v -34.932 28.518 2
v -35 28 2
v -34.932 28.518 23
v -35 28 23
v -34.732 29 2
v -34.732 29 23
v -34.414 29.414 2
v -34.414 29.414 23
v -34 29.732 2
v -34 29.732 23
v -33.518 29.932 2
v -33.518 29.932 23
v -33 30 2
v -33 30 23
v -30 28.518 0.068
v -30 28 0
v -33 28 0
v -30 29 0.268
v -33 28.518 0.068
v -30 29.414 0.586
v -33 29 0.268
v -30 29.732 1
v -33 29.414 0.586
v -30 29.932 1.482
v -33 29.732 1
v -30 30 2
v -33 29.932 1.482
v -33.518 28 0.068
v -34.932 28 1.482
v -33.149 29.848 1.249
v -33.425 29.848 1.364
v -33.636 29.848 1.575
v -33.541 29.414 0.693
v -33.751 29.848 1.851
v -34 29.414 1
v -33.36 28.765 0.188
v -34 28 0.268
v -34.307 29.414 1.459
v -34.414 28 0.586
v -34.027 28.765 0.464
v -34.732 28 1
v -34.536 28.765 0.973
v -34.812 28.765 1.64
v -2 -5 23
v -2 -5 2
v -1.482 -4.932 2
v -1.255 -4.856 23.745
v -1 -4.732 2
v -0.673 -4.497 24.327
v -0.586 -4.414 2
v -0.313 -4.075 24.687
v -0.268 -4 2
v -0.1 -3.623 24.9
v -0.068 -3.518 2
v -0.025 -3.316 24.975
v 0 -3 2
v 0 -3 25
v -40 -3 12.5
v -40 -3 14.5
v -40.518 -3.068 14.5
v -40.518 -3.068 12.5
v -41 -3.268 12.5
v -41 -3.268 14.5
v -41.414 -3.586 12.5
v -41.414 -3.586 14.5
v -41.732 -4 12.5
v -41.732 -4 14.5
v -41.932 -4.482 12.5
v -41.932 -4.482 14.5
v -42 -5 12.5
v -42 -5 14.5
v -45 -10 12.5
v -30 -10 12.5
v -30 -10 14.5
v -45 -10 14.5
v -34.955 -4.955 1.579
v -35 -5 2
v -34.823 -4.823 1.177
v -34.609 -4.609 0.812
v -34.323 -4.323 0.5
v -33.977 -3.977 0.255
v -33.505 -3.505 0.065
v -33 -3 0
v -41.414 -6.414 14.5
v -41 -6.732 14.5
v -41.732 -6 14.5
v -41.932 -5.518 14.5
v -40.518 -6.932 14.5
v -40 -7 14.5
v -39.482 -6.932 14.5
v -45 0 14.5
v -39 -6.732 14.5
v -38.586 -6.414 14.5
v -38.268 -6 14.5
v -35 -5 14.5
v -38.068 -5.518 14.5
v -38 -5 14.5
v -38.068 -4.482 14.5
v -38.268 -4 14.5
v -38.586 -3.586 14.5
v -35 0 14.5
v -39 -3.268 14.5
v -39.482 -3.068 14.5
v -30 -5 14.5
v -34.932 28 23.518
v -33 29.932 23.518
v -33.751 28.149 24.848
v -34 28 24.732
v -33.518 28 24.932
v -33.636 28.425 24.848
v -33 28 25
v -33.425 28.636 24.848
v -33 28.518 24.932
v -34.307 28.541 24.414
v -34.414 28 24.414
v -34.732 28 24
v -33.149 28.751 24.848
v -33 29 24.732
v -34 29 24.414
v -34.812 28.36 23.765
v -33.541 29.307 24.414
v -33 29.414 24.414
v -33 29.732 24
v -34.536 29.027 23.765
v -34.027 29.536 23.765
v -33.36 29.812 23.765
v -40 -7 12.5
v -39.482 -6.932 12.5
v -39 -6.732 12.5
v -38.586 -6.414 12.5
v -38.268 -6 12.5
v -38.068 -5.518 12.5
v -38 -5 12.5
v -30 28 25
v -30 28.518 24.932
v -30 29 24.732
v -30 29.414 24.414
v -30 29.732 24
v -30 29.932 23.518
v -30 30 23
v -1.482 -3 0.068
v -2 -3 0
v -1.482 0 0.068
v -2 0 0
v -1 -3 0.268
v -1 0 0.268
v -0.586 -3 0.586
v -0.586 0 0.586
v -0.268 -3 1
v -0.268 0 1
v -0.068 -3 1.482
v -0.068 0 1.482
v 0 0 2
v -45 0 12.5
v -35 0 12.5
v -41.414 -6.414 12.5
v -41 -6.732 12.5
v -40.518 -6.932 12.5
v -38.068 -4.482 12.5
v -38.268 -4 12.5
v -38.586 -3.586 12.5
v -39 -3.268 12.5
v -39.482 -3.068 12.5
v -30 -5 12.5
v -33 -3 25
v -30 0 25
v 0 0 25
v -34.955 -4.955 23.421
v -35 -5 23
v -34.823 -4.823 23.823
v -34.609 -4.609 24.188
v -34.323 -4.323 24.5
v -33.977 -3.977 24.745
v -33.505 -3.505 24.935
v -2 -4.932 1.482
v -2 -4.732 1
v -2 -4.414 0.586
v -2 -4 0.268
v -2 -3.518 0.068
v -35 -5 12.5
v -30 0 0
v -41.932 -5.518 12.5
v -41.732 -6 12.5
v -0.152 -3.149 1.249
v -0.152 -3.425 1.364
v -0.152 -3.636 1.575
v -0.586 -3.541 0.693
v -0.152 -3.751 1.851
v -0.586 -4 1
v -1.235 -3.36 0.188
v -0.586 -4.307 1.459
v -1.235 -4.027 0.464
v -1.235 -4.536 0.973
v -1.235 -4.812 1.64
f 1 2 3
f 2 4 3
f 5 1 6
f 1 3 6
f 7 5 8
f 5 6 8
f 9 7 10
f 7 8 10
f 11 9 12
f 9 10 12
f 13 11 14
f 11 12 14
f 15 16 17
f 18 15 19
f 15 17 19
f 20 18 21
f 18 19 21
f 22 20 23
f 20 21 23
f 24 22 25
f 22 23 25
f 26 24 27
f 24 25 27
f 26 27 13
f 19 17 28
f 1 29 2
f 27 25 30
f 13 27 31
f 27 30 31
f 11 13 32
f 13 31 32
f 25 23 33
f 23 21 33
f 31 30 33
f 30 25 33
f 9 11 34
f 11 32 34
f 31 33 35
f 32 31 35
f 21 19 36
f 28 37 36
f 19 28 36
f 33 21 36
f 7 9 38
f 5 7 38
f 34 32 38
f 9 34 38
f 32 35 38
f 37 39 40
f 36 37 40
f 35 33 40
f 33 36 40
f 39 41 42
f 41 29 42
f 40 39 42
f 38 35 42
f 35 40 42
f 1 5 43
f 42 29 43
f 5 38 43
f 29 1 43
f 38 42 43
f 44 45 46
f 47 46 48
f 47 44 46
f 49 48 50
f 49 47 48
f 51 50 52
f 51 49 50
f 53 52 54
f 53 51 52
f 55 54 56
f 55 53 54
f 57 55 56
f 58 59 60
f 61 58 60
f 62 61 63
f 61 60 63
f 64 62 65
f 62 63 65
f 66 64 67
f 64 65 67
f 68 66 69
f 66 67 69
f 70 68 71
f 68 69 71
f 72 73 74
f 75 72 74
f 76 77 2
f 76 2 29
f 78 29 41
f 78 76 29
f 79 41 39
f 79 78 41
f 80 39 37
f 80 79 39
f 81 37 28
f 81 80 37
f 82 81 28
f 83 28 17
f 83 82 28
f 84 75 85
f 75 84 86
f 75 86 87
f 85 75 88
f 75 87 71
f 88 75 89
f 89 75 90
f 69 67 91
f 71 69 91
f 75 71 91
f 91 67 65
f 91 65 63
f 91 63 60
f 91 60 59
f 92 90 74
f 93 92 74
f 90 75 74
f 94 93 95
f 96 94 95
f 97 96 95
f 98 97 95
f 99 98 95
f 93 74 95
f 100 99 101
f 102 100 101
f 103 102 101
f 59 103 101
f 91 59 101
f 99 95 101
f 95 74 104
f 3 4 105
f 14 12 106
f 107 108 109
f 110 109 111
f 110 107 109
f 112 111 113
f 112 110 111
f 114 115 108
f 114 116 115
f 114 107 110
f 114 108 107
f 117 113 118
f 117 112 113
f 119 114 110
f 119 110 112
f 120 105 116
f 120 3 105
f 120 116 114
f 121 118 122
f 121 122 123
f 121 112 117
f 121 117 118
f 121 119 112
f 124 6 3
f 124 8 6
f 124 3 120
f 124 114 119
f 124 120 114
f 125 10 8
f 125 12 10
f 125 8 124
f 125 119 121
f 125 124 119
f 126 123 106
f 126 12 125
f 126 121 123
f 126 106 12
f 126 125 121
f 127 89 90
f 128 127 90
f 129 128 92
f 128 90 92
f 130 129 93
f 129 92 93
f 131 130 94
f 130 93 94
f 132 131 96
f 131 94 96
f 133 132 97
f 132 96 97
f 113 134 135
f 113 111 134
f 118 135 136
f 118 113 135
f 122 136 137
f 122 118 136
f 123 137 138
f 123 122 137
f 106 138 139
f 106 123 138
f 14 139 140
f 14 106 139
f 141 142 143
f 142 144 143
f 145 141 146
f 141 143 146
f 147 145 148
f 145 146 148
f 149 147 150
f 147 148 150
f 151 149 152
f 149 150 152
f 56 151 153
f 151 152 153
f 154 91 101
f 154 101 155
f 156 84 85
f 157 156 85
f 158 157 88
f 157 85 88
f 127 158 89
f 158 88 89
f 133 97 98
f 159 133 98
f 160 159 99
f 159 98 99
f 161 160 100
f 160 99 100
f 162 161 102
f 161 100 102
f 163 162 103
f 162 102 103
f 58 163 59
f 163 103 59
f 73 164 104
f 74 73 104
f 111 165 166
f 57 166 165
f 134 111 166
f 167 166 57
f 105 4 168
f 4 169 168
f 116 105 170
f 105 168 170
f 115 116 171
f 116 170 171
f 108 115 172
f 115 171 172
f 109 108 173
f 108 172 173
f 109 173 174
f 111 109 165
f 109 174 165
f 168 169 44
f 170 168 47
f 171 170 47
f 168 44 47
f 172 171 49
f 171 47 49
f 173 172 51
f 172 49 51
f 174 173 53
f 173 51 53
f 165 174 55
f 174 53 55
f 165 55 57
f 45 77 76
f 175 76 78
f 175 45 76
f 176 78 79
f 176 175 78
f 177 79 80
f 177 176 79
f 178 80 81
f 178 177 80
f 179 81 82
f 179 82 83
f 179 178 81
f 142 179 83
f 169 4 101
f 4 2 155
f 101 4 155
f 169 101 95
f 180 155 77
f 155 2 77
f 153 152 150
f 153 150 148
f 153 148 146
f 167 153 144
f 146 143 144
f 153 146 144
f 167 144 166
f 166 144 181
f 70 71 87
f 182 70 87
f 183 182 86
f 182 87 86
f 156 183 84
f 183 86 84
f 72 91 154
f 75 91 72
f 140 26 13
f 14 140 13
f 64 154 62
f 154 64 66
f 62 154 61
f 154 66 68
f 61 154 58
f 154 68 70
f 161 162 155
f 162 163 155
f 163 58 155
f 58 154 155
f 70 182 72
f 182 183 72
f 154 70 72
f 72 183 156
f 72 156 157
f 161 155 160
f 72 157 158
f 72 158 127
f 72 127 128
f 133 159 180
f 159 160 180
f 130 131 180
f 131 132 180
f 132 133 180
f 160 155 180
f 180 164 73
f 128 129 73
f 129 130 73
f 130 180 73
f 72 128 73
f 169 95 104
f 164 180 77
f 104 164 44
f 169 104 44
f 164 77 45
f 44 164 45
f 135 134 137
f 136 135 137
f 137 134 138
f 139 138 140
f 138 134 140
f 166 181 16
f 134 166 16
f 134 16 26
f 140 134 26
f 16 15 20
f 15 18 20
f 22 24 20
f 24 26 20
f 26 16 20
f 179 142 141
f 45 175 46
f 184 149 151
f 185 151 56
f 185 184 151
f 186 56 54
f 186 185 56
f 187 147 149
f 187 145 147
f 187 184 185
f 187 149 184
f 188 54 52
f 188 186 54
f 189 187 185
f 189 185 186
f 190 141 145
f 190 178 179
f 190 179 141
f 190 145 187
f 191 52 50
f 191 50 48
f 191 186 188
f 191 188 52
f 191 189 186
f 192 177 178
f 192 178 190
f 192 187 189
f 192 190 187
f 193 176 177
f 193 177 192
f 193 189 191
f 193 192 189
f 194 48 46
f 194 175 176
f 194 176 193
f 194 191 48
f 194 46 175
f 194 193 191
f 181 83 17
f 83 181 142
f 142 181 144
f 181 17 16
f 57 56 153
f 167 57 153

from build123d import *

# Parameters (mm, degrees)
F1_DEPTH = 25
F2_W     = 5
F2_H     = 2
F3_DEPTH = 5
F5_DEPTH = 10
F7_DEPTH = 25
F8_R     = 2


with BuildPart() as f1:
    # F0 (on Top) → F1 (new body)
    with BuildSketch(Plane.XY):
        Polygon((0, -5), (0, 0), (-30, 0), (-30, 30), (-35, 30), (-35, -5), align=None)
    extrude(amount=F1_DEPTH)

    # F2 (on face) → F3 (join)
    with BuildSketch(Plane.XZ.offset(5)):
        with Locations((-32.5, 13.5)):
            Rectangle(F2_W, F2_H)
    extrude(amount=F3_DEPTH)

    # F4 (on face) → F5 (join)
    with BuildSketch(Plane(origin=(-35, 0, 0), x_dir=(0, -1, 0), z_dir=(-1, 0, 0))):
        Polygon((10, 14.5), (5, 14.5), (0, 14.5), (0, 12.5), (5, 12.5), (10, 12.5), align=None)
    extrude(amount=F5_DEPTH)

    # F6 (on face) → F7 (cut)
    with BuildSketch(Plane.XY.offset(14.5)):
        with BuildLine():
            Line((-40, -7), (-40, -5))
            Line((-40, -5), (-41.4142135624, -6.4142135624))
            ThreePointArc((-41.4142135624, -6.4142135624), (-40.7653668647, -6.847759065), (-40, -7))
        make_face()
        with BuildLine():
            ThreePointArc((-40, -7), (-38.5857864376, -6.4142135624), (-38, -5))
            Line((-38, -5), (-40, -5))
            Line((-40, -5), (-40, -7))
        make_face()
        with BuildLine():
            Line((-40, -5), (-38, -5))
            ThreePointArc((-38, -5), (-38.5857864376, -3.5857864376), (-40, -3))
            Line((-40, -3), (-40, -5))
        make_face()
        with BuildLine():
            Line((-42, -5), (-40, -5))
            Line((-40, -5), (-40, -3))
            ThreePointArc((-40, -3), (-41.4142135624, -3.5857864376), (-42, -5))
        make_face()
        with BuildLine():
            Line((-41.4142135624, -6.4142135624), (-40, -5))
            Line((-40, -5), (-42, -5))
            ThreePointArc((-42, -5), (-41.847759065, -5.7653668647), (-41.4142135624, -6.4142135624))
        make_face()
    extrude(amount=-F7_DEPTH, mode=Mode.SUBTRACT)

    # F8
    f8_edges = [f1.edges().sort_by_distance(p)[0] for p in [
        (-35, 12.5, 0),
        (-17.5, -5, 0),
        (0, -2.5, 0),
        (-32.5, 30, 0),
        (-35, 30, 12.5),
        (-35, 12.5, 25),
        (-32.5, 30, 25),
        (-17.5, -5, 25),
        (0, -5, 12.5),
    ]]
    fillet(f8_edges, radius=F8_R)


solid = f1.part
